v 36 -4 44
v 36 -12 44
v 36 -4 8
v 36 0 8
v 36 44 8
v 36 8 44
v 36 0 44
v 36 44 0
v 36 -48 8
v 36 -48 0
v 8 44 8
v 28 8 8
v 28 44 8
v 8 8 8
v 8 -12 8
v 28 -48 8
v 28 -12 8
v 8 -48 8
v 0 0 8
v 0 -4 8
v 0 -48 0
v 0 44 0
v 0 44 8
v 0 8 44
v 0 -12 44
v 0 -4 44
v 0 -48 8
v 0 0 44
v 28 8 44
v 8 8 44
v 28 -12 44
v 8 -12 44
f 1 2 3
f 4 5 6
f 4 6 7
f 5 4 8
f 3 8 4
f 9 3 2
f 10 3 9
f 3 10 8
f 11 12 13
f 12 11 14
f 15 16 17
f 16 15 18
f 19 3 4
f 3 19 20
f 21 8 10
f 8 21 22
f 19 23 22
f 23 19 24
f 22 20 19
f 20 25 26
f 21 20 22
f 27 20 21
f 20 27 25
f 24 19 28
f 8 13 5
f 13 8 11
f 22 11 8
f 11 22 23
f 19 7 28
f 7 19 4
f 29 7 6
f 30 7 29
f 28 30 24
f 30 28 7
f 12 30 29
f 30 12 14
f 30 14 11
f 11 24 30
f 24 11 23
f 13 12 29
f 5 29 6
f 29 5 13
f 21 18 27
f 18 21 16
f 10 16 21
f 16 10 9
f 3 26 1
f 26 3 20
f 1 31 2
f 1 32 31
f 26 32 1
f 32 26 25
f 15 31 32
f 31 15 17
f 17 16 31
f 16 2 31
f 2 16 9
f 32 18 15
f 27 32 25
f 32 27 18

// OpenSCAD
$t = 4; //Mimi hat 4mm Plexiglasdicke geschickt
$h = 36;
$th = $t*2;
$ht = $h + $th; //height and width = 50 + 4 (t)

module winkel()
{
cube([$h,$ht,$th]);
cube([$h,$th,$ht]);
}

module stabilizer()
{
translate([$th,0,0])
rotate([0,-90,0])
linear_extrude(height=$th)
polygon([[$th,$ht],[$ht,$th],[0,0]]);
}

module complete()
{
winkel();
stabilizer();
translate([$h-$th,0,0])
stabilizer();
}

module edgeholder()
{
complete();
translate([$h,-$t,0])
rotate([0,0,180])
complete();

translate([0,-$ht-$t,0])
cube([$h,$ht*2+$t,$th]);
}

$breite=800;//80*92cm
$hoehe=920/2;

module window()
{
color("white")
translate([0,-$t,$th])
cube([$breite,$t,$hoehe]);
}

module middleholder()
{
translate([$breite-$h+$th/2,0,0])
edgeholder();
translate([$breite-$th/2,0,0])
edgeholder();
}

module windows()
{
window();
color("silver")
translate([$breite,0,0])
window();
}

//windows();

edgeholder();

//middleholder();

//translate([$breite*2-$ht,0,0])
//edgeholder();
